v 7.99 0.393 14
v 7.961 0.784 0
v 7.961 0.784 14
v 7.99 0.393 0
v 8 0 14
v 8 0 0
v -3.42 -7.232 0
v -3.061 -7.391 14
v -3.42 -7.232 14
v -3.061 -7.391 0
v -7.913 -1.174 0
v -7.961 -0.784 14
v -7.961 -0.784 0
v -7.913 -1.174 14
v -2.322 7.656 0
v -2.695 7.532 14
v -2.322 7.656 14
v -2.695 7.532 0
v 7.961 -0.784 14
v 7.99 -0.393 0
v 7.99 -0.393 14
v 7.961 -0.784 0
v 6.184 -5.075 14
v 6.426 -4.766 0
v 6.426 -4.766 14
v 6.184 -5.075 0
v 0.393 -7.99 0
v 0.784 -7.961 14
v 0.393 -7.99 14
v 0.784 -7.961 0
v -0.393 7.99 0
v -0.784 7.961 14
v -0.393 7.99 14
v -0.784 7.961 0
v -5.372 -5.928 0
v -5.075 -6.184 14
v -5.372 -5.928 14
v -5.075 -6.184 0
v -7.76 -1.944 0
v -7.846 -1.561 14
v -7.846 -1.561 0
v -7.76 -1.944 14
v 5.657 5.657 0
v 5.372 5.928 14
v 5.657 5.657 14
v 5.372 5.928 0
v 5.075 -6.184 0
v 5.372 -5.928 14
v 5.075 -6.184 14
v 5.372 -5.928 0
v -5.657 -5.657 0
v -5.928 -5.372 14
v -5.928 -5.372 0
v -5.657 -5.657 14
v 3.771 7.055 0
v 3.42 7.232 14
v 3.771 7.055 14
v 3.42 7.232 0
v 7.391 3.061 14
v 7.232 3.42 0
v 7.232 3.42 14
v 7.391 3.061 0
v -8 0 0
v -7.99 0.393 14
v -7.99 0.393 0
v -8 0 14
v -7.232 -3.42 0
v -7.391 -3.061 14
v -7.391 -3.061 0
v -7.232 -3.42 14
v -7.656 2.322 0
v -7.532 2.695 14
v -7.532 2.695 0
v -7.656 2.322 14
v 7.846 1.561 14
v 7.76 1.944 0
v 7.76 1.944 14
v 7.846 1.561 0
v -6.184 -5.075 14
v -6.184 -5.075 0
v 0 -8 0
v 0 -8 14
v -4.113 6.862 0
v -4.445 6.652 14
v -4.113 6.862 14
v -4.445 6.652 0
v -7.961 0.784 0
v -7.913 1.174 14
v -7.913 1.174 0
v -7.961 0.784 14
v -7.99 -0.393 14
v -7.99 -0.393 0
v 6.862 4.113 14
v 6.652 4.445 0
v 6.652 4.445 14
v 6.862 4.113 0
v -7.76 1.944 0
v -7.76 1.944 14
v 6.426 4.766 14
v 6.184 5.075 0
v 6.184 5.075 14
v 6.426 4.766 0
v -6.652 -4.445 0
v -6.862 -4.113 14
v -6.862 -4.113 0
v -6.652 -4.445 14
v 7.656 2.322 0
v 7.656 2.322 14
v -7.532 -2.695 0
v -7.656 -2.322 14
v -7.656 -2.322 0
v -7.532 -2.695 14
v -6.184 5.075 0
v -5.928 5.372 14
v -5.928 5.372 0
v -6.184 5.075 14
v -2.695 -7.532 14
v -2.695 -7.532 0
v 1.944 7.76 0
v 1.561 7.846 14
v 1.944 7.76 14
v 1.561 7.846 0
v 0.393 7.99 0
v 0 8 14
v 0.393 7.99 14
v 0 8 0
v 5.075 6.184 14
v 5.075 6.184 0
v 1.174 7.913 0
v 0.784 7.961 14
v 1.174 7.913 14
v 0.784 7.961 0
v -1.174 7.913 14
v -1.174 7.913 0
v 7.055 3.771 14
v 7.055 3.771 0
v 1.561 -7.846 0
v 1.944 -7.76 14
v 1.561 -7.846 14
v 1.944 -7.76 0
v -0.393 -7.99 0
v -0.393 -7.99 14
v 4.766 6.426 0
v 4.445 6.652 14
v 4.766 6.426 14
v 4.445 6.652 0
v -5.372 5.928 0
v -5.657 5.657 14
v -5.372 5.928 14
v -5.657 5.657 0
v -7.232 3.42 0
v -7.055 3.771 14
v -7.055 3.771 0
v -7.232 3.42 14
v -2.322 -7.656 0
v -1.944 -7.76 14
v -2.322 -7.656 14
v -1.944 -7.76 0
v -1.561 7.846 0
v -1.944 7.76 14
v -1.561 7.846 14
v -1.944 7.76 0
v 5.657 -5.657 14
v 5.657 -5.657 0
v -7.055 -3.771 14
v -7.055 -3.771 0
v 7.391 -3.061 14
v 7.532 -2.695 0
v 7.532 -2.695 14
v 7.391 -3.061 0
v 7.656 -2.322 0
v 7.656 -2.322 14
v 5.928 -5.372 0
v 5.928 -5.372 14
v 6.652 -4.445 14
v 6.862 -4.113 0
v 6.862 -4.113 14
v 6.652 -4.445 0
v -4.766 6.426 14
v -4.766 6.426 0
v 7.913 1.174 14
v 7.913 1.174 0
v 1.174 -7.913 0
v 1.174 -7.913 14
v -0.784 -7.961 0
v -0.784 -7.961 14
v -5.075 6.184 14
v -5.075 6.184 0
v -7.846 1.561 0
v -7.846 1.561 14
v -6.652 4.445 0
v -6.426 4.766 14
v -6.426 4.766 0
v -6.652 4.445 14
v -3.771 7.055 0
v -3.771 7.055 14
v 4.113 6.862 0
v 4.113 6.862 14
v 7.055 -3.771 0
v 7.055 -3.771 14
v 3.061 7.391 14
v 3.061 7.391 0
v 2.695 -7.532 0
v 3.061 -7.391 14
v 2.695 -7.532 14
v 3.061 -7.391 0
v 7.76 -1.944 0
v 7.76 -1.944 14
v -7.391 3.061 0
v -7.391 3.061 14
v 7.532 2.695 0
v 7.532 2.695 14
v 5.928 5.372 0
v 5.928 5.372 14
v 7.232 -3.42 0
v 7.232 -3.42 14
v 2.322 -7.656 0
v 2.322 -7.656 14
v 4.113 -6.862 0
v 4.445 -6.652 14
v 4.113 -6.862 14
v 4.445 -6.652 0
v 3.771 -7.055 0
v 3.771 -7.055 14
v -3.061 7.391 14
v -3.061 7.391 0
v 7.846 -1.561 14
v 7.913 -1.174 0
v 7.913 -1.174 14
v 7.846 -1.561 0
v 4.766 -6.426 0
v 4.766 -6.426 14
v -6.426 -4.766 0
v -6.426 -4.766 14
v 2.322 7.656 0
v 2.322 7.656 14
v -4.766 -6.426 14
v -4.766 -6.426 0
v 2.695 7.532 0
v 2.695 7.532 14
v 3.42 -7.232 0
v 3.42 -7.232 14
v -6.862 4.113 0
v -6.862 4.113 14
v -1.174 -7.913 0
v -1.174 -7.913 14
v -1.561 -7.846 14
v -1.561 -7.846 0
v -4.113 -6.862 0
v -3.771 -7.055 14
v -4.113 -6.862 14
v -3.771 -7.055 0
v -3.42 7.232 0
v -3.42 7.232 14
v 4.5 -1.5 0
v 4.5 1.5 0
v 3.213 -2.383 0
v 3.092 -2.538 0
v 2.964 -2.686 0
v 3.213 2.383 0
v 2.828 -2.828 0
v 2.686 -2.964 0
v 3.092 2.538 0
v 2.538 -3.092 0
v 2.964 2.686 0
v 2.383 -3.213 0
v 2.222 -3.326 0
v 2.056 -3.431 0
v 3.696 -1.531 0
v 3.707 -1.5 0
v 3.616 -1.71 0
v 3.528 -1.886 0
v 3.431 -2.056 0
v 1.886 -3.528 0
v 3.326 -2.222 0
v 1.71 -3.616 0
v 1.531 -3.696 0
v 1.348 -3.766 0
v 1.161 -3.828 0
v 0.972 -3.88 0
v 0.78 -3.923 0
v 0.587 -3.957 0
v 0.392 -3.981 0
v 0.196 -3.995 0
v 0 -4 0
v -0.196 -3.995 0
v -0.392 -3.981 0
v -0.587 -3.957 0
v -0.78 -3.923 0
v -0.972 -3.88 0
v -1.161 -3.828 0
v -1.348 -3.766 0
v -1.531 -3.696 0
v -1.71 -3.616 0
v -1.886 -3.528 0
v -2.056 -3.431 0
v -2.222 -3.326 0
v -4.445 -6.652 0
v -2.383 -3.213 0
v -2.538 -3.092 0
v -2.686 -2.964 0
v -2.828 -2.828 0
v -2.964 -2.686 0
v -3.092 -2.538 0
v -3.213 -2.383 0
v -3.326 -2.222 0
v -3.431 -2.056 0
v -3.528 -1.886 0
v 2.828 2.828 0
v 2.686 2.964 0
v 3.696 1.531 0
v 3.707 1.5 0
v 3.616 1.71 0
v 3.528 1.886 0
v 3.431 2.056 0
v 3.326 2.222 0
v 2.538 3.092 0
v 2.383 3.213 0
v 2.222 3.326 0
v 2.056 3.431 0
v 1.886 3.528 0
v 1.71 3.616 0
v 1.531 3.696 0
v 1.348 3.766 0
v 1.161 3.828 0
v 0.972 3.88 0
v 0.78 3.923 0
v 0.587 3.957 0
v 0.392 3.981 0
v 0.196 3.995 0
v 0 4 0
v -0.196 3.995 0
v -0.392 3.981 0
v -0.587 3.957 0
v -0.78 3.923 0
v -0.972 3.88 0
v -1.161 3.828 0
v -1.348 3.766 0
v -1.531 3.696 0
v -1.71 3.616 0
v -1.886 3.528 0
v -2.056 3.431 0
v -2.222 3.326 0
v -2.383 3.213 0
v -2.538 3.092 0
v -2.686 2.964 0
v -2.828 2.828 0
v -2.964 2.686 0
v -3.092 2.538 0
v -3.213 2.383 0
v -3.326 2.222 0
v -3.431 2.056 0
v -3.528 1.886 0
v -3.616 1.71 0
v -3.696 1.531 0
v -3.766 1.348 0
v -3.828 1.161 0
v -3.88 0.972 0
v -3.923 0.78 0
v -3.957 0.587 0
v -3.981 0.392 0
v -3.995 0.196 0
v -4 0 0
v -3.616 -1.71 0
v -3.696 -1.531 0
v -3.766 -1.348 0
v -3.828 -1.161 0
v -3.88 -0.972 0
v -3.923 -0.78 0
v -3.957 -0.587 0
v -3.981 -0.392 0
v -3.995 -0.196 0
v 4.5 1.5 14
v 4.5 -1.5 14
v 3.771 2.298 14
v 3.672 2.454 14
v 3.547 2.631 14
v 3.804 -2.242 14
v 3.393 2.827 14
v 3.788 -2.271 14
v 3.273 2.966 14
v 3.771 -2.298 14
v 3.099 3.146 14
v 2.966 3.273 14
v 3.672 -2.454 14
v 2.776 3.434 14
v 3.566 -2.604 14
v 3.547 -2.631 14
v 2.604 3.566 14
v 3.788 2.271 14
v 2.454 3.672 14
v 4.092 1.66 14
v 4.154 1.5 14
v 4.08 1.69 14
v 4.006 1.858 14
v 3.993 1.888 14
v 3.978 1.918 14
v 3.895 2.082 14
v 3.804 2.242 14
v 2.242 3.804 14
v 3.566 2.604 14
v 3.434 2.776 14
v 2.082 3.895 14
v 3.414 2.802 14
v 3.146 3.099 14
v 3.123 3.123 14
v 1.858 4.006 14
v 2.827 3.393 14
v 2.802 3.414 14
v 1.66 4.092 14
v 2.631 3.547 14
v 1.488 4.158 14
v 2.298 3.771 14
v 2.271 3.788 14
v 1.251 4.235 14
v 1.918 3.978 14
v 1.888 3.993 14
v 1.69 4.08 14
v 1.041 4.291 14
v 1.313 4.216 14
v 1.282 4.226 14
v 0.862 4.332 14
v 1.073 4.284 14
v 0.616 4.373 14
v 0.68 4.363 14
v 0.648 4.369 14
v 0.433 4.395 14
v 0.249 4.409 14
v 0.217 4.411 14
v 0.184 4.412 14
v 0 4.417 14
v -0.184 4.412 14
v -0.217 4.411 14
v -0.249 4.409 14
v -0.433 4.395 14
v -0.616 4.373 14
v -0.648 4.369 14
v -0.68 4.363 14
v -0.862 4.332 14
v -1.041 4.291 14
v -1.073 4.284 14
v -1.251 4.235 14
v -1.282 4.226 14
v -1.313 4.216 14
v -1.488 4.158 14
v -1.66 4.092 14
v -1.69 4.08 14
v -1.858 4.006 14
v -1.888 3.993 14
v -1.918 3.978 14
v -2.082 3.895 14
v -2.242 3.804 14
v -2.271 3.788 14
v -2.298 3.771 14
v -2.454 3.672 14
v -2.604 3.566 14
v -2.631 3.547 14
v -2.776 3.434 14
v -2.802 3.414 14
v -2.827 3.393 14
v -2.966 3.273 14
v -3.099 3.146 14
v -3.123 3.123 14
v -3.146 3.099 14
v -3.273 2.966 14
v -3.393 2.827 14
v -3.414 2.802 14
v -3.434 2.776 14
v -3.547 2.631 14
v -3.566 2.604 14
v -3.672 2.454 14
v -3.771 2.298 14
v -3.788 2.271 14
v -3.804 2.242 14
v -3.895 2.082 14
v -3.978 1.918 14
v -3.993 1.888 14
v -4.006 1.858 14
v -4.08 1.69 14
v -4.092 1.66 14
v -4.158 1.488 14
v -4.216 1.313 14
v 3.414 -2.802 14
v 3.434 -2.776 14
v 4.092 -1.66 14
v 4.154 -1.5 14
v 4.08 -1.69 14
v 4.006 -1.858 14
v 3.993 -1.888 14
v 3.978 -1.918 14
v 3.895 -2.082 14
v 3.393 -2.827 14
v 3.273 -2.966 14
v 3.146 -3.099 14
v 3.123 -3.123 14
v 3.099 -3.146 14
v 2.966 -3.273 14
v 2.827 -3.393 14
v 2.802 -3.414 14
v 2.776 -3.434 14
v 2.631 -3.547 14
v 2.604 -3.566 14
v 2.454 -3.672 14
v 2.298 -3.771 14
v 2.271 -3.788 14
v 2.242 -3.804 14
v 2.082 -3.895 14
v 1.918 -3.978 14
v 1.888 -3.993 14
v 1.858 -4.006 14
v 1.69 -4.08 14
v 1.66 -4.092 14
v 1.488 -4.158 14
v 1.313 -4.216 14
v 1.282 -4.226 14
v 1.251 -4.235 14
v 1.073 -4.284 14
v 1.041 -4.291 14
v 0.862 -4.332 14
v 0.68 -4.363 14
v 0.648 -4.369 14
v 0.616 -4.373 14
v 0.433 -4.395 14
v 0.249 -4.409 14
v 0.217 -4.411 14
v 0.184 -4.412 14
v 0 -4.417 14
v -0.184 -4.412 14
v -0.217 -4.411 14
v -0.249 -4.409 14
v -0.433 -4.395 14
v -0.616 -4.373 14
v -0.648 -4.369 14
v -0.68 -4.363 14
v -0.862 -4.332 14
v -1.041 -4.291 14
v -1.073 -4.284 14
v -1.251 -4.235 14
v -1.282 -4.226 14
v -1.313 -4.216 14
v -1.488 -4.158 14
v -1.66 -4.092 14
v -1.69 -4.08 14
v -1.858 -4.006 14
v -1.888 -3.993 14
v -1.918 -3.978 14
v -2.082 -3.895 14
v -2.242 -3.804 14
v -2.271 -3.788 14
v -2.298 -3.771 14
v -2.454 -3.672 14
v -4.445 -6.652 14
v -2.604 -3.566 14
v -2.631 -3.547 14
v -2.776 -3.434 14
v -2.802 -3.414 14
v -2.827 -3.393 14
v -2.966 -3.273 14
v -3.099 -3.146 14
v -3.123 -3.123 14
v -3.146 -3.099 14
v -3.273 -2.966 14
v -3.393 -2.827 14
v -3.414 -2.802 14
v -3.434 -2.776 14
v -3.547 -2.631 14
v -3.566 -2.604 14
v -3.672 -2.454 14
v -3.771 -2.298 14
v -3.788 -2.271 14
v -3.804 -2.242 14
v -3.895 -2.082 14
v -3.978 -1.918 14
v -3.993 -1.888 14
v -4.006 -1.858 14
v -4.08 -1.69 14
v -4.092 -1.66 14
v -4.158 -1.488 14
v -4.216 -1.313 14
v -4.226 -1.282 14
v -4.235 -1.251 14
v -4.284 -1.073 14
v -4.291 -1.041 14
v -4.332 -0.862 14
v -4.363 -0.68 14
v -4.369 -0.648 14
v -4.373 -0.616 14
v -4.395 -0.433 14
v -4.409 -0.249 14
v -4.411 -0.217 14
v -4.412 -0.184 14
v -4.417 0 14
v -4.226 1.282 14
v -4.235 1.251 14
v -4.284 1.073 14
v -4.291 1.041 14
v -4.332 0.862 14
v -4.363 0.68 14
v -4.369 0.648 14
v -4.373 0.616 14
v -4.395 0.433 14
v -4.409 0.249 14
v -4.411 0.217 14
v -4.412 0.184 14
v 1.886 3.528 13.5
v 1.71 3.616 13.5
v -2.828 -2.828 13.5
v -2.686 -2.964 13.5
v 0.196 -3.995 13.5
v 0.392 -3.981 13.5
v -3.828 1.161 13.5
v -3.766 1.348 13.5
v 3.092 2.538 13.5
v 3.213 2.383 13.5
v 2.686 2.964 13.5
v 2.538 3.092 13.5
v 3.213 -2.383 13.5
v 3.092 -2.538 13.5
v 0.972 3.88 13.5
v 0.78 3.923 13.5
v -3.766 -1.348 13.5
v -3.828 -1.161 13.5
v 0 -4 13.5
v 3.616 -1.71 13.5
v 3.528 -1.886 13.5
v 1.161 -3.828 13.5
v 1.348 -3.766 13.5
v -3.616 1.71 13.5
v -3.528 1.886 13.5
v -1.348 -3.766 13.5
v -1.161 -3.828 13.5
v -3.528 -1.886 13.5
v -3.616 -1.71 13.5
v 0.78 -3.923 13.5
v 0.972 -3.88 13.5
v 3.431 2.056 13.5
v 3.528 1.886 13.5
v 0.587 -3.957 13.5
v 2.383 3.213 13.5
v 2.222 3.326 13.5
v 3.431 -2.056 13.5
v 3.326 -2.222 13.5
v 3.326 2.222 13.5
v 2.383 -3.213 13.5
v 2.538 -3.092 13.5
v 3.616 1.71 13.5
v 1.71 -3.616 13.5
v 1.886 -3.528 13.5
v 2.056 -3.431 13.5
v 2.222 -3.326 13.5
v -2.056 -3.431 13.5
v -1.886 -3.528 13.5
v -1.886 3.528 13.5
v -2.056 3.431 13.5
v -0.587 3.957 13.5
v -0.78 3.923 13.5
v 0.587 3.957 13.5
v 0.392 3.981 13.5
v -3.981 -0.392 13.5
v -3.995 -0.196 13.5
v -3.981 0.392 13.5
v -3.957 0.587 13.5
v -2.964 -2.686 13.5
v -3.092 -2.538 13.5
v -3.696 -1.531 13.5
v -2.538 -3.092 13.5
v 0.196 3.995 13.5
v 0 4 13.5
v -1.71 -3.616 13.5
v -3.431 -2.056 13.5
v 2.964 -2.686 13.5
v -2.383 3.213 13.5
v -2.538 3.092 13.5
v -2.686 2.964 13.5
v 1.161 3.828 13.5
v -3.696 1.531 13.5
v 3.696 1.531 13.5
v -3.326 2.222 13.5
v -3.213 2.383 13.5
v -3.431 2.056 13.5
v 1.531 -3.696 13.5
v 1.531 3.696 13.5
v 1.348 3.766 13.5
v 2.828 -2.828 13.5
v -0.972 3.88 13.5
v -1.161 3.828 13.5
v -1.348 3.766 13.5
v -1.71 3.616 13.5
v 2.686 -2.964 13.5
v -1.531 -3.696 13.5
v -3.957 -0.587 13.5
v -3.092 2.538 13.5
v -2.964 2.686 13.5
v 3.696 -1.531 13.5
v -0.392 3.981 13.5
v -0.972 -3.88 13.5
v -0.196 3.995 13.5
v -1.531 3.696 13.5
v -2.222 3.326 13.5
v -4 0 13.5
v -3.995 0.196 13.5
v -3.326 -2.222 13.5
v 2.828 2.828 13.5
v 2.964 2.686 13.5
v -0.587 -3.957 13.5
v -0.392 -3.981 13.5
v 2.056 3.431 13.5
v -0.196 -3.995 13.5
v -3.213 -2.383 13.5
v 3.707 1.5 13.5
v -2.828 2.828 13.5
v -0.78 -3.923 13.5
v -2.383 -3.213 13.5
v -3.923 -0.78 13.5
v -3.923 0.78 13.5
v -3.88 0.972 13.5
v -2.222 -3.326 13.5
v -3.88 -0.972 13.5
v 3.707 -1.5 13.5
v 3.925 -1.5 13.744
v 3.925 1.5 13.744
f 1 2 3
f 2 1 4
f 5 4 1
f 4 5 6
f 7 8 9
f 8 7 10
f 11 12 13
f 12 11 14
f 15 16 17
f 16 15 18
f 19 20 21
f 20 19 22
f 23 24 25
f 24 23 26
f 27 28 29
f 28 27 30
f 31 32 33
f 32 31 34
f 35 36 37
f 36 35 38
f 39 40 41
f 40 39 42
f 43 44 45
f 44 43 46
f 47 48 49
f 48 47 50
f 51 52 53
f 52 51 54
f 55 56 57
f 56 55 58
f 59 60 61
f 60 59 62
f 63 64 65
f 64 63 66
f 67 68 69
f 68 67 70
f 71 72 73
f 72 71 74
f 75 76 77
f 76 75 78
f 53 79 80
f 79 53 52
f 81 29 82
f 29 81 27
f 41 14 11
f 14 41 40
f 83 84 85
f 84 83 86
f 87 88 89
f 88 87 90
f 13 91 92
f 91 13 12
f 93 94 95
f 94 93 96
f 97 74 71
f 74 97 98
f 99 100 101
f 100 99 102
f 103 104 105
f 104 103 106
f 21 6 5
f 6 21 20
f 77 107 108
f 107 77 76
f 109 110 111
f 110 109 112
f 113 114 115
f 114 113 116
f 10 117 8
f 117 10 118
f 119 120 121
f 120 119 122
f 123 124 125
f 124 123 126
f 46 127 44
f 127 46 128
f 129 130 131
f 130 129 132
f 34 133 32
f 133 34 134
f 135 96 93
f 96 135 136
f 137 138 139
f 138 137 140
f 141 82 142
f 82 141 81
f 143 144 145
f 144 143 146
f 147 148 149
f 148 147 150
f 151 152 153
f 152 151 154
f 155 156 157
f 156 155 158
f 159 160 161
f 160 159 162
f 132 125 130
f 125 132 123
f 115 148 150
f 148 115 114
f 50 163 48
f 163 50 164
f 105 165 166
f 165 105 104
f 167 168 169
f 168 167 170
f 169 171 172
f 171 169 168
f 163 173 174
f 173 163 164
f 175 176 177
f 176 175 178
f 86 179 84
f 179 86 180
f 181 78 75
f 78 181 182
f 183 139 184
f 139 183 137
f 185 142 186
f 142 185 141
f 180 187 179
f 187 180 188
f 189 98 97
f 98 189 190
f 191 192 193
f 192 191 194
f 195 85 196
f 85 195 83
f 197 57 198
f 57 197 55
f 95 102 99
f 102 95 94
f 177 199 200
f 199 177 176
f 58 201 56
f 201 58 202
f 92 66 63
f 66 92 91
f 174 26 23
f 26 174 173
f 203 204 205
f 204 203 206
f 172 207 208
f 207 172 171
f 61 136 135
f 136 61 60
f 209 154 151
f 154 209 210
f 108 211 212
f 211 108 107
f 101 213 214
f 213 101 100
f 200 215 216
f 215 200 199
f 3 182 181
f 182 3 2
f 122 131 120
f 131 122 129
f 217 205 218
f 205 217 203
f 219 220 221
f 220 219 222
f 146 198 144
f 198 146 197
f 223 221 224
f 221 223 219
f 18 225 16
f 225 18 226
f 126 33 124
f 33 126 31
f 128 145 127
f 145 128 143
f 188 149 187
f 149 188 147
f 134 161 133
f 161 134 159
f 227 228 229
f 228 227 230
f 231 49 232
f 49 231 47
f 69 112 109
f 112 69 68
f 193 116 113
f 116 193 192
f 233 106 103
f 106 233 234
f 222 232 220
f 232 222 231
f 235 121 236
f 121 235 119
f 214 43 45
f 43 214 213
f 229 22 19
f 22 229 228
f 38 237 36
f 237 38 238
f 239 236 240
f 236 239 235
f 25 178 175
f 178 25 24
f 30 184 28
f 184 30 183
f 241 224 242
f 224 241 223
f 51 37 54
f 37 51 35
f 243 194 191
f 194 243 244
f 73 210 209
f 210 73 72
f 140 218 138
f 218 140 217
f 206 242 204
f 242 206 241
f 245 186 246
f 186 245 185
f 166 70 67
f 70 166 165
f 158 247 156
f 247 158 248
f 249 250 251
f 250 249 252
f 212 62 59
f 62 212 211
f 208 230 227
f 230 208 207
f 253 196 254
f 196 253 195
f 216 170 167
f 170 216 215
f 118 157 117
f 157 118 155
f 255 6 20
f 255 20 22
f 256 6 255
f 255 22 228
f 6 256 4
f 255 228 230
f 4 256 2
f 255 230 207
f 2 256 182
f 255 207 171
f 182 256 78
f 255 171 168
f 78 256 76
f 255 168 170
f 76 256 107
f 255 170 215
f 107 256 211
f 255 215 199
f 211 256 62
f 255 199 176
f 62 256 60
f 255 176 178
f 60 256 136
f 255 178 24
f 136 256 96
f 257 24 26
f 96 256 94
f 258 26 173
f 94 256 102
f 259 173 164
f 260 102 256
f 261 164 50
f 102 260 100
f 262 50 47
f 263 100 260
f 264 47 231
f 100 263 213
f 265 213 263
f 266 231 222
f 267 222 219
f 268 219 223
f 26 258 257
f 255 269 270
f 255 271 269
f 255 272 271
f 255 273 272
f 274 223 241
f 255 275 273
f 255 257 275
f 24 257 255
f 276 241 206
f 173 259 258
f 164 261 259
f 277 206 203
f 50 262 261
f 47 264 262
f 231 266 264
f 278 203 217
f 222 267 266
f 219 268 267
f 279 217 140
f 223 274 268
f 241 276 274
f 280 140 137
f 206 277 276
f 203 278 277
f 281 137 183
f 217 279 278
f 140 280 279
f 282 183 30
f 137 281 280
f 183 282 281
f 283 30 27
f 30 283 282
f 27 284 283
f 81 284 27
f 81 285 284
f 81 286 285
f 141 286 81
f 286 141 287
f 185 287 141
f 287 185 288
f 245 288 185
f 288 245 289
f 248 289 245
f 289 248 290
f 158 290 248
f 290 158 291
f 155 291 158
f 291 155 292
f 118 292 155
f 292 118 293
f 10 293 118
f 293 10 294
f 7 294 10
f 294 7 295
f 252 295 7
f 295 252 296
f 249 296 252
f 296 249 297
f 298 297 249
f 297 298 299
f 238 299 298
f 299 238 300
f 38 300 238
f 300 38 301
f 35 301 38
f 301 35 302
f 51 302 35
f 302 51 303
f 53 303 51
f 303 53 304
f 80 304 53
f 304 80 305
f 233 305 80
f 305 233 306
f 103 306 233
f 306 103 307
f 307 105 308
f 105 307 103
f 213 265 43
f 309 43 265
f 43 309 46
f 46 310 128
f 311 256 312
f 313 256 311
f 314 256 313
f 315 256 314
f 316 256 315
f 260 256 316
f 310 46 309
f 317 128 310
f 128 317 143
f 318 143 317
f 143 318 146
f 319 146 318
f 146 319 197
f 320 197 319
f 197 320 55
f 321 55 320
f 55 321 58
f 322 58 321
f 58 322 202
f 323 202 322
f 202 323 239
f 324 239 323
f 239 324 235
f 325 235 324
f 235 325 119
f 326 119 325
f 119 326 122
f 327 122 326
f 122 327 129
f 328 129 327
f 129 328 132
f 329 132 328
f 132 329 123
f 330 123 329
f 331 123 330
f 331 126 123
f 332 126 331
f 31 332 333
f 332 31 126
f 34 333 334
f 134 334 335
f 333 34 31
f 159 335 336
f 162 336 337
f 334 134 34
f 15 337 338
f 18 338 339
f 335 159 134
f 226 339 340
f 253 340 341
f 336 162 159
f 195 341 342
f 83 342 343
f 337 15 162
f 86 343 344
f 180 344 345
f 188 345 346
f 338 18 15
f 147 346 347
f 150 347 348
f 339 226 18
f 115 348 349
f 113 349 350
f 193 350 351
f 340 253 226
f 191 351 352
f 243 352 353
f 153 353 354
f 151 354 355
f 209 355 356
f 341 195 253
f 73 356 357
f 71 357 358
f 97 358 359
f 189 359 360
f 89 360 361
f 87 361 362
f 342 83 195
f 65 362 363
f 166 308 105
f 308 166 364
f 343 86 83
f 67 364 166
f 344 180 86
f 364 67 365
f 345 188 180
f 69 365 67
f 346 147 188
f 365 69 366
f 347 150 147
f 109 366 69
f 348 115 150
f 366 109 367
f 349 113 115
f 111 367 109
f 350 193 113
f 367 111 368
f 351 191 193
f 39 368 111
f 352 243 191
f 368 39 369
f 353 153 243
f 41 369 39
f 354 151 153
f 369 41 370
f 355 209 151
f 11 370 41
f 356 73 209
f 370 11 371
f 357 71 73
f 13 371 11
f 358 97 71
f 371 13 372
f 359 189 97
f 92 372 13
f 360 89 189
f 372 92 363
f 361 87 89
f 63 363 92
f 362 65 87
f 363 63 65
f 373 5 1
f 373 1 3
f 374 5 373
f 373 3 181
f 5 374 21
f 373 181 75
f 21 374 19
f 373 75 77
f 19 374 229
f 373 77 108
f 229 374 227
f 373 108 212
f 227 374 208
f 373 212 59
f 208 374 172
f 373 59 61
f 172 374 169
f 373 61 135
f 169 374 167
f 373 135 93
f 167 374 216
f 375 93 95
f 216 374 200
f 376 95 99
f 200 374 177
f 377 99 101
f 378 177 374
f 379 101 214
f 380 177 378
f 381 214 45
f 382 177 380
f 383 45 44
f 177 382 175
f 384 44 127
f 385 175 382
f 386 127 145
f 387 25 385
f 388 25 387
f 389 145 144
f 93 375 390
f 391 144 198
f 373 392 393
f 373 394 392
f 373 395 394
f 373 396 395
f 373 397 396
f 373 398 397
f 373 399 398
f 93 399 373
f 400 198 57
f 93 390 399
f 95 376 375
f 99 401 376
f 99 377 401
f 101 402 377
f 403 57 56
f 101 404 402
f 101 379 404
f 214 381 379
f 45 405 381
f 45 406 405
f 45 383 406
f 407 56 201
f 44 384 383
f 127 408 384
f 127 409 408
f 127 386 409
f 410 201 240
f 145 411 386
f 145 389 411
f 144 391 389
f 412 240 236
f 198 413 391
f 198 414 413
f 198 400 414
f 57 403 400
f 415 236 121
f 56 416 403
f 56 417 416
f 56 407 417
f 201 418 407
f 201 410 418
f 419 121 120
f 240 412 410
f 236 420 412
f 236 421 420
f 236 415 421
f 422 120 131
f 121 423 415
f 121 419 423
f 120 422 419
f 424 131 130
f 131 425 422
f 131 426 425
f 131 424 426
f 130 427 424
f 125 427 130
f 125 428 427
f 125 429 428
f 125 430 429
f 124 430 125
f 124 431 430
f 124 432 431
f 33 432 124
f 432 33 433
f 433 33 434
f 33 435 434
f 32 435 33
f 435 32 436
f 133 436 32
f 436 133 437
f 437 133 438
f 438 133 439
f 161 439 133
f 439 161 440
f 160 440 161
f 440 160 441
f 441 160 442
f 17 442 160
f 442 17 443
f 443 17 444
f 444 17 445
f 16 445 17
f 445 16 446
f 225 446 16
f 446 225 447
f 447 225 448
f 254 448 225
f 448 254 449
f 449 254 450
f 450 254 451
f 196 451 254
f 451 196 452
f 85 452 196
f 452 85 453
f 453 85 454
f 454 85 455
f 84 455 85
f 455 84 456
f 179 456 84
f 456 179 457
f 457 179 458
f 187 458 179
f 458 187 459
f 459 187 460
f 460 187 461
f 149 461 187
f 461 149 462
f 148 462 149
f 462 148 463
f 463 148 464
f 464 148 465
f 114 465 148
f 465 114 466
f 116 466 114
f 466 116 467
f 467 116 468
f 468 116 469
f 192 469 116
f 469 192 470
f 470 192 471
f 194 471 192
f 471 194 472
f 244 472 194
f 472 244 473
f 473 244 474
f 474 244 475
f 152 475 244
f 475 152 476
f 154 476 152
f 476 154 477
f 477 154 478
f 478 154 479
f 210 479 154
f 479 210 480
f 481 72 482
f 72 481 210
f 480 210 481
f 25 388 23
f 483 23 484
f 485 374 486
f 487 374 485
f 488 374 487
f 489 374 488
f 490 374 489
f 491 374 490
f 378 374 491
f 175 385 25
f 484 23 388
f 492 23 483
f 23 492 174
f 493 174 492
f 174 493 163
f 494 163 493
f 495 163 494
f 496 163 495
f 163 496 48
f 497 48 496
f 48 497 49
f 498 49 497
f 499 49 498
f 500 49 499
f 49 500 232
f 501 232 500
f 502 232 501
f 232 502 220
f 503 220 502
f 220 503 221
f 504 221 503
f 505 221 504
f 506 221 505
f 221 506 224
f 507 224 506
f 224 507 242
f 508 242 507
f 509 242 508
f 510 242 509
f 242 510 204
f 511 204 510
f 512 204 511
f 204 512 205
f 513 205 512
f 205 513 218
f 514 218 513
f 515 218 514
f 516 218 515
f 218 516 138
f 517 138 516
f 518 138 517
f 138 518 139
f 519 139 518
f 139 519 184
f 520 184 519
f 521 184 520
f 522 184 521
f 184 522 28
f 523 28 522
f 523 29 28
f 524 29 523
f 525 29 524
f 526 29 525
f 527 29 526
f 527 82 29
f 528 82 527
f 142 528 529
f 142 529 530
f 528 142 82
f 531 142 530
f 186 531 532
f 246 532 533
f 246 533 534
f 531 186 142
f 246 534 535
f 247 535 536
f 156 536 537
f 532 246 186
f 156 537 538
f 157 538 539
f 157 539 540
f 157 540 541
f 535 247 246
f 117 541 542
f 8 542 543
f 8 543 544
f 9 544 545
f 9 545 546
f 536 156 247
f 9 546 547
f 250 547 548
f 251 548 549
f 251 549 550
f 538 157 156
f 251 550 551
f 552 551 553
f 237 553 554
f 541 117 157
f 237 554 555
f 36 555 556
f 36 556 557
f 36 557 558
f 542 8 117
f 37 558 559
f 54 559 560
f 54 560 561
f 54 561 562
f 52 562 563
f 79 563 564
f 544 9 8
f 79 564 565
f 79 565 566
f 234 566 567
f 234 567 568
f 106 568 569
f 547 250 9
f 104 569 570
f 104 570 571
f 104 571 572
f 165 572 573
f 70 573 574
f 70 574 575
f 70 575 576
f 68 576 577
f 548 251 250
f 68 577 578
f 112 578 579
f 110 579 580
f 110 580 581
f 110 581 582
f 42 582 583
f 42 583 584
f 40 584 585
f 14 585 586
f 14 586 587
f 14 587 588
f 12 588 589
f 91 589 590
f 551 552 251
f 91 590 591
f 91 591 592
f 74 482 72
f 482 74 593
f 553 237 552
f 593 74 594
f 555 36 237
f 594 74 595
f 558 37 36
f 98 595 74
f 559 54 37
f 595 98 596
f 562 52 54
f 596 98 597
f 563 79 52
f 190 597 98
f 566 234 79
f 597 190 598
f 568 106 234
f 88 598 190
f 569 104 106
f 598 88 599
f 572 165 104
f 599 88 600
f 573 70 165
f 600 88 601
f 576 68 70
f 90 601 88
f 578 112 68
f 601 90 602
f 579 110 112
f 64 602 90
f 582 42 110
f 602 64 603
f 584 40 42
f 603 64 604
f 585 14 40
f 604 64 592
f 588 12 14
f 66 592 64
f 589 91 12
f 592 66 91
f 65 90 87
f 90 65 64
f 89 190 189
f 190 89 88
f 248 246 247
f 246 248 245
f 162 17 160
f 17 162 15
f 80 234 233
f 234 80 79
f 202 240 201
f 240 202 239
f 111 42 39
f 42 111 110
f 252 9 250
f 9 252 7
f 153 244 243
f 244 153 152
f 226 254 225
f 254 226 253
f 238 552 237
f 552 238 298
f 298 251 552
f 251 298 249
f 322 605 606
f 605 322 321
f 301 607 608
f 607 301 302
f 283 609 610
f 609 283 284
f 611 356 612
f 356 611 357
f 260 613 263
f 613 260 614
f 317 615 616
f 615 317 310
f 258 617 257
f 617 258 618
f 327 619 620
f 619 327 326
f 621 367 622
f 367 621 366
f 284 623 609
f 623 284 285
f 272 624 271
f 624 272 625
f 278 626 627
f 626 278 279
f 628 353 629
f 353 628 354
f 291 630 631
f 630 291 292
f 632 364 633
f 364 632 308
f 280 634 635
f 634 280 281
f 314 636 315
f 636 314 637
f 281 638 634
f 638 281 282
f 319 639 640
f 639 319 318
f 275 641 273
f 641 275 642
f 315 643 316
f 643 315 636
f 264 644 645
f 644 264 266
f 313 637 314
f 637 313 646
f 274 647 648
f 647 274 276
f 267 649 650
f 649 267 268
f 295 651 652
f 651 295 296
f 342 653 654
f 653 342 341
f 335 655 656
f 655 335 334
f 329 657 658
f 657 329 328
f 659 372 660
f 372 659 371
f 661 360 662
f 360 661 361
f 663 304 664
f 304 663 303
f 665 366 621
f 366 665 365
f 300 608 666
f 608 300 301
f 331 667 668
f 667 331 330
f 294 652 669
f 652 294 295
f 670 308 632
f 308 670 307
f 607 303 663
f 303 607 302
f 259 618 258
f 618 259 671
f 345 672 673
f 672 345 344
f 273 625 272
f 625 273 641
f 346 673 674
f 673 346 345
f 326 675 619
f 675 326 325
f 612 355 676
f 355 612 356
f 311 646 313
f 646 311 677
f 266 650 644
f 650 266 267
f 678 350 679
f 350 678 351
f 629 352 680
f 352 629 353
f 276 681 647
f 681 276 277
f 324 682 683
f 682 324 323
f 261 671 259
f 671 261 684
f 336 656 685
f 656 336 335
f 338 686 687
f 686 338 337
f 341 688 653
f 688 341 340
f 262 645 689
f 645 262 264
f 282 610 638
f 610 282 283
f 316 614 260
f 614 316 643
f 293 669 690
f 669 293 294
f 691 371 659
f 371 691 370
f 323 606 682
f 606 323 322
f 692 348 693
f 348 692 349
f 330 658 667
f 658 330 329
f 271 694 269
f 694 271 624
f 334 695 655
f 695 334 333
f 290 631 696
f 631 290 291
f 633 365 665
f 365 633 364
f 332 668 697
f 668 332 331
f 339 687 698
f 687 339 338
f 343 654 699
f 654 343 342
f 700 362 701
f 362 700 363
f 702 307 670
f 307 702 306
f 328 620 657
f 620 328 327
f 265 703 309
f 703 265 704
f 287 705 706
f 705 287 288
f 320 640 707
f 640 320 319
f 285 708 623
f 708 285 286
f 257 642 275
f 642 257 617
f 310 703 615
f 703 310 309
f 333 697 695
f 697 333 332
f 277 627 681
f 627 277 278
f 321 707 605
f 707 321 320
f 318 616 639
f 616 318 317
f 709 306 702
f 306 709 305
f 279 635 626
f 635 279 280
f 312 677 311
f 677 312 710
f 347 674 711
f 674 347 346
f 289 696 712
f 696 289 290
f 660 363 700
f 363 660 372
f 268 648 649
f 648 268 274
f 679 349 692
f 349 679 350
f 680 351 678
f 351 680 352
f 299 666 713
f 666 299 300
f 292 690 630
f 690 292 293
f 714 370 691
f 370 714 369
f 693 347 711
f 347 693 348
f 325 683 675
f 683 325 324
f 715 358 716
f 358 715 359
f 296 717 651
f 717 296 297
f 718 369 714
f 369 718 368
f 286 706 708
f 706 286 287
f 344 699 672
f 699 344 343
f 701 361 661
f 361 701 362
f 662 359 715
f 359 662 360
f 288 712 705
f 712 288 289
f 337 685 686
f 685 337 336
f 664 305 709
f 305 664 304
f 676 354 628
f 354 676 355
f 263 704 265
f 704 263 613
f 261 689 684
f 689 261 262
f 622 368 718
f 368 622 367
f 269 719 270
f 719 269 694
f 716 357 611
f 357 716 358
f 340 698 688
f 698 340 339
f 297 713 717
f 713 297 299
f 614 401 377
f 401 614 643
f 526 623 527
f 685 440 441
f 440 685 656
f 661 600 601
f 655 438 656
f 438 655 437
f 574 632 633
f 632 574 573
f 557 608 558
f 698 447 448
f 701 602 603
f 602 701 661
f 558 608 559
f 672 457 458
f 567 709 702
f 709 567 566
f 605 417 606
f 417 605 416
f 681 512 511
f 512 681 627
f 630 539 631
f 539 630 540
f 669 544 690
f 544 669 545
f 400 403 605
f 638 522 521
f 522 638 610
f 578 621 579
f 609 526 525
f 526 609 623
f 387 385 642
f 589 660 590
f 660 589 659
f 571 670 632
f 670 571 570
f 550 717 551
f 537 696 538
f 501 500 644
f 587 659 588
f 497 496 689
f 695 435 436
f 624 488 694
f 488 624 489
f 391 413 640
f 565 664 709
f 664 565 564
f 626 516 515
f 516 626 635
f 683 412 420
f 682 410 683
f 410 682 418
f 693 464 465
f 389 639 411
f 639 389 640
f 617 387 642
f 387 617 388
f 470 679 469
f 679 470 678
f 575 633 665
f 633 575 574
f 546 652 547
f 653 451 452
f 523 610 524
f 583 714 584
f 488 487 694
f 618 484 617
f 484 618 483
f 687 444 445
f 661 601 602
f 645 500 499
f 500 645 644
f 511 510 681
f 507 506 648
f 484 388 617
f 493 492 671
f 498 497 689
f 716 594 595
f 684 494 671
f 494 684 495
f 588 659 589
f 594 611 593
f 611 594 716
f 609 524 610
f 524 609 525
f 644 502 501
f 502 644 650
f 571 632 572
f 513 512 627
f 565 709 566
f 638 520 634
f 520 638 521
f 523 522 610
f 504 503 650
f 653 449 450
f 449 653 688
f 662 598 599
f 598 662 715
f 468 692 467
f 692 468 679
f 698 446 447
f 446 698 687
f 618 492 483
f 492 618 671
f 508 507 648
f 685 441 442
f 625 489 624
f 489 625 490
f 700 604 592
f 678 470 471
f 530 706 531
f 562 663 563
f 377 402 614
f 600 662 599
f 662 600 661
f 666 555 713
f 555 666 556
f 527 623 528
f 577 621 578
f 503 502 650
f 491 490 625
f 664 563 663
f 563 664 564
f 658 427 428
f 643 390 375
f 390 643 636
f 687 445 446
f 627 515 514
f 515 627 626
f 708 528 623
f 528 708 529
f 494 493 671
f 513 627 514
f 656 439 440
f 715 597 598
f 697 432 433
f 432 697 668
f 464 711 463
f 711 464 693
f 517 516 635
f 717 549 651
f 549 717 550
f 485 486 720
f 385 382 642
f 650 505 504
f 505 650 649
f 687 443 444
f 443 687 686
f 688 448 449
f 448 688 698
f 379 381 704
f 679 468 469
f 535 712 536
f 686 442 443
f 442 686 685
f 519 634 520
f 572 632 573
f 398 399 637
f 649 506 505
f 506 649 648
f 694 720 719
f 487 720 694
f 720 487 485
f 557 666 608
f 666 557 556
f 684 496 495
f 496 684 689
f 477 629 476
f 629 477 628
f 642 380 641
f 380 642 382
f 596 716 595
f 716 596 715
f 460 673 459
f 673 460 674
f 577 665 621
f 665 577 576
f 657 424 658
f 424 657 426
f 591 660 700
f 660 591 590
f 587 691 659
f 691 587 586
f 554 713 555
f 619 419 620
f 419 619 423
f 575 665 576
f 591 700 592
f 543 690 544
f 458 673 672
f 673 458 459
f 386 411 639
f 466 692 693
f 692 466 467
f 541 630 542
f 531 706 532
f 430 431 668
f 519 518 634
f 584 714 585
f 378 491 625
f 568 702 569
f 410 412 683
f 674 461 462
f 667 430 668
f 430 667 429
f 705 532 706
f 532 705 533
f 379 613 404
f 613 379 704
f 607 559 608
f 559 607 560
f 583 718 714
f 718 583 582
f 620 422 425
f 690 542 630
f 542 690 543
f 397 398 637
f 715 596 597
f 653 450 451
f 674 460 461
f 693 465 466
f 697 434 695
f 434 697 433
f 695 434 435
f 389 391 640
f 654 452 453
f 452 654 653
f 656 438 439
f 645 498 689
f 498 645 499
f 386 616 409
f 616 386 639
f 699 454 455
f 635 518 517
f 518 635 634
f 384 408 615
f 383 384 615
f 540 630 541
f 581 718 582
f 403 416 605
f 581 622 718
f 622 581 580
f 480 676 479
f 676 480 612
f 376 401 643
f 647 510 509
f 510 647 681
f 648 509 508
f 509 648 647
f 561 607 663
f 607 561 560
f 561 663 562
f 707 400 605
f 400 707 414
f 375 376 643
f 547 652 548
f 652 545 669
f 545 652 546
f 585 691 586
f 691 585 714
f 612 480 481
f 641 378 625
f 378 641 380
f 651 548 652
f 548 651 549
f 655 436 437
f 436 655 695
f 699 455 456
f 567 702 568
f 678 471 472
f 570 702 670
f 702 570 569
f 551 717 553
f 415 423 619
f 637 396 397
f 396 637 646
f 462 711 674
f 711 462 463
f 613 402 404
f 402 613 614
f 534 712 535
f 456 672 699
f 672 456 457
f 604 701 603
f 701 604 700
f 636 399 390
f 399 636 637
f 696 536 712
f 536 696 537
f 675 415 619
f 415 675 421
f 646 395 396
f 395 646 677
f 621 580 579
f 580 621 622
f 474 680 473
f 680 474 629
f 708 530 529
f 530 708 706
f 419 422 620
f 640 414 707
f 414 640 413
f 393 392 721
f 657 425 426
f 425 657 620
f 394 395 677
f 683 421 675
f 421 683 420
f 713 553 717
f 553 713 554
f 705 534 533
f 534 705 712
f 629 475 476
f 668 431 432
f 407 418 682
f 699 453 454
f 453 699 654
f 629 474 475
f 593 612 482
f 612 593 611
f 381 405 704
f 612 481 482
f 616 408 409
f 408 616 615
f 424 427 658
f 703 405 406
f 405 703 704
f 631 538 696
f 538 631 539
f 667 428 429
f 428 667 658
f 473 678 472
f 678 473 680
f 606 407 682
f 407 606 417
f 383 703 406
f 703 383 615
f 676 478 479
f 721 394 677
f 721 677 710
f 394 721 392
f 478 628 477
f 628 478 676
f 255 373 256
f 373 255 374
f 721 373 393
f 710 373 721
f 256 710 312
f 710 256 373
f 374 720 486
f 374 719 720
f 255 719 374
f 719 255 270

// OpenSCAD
// ============================================================
//  Parametric Transmission Generator — OpenSCAD
//  Author:  olesiapal
//  Version: 3.0
//  License: MIT
//
//  Modes:
//    • single       — one configurable spur or herringbone gear
//    • pair         — matched gear pair with auto centre distance
//    • mesh_preview — pair with visual debugging colours
//
//  The public interface is built around:
//    • gear(...)
//    • gear_pair(...)
//
//  Geometry is parameter-driven per gear, so the mate no longer
//  depends on the primary gear's global tooth definition.
// ============================================================

/* [Render Mode] */
render_mode    = "single"; // single / pair / mesh_preview
show_mate      = false;    // Legacy flag: true -> pair mode
$fn            = 128;

/* [Primary Gear] */
module_size    = 2;        // Metric module [mm]
num_teeth      = 24;       // Primary tooth count
pressure_angle = 20;       // Pressure angle [deg]
gear_height    = 10;       // Face width [mm]
backlash       = 0.10;     // Backlash per flank [mm]

hub_diameter   = 16;       // Hub OD [mm]
hub_height     = 14;       // Hub height [mm]
bore_diameter  = 8;        // Bore diameter [mm]
keyway_width   = 3;        // Keyway width [mm]
keyway_depth   = 1.8;      // Keyway radial depth [mm]

enable_spokes  = true;     // Weight-reduction pockets
spoke_count    = 5;        // Number of spokes
spoke_width    = 5;        // Spoke width [mm]
pocket_floor   = 1.5;      // Pocket floor [mm]

tip_chamfer    = 0.3;      // Tooth tip break edge [mm]
bore_chamfer   = 0.5;      // Bore chamfer [mm]

herringbone    = false;    // Enable double-helical geometry
helix_angle    = 25;       // Helix angle [deg]

/* [Mate Gear] */
mate_module_size    = 2;      // Mate module [mm]
mate_teeth          = 16;     // Mate tooth count
mate_pressure_angle = 20;     // Mate pressure angle [deg]
mate_gear_height    = 10;     // Mate face width [mm]
mate_backlash       = 0.10;   // Mate backlash [mm]

mate_hub_diameter   = 14;     // Mate hub OD [mm]
mate_hub_height     = 12;     // Mate hub height [mm]
mate_bore_diameter  = 6;      // Mate bore [mm]
mate_keyway_width   = 0;      // Mate keyway width [mm]
mate_keyway_depth   = 1.8;    // Mate keyway radial depth [mm]

mate_enable_spokes  = true;   // Mate spoke pockets
mate_spoke_count    = 4;      // Mate spoke count
mate_spoke_width    = 4;      // Mate spoke width [mm]
mate_pocket_floor   = 1.5;    // Mate pocket floor [mm]

mate_tip_chamfer    = 0.2;    // Mate tooth tip break edge [mm]
mate_bore_chamfer   = 0.4;    // Mate bore chamfer [mm]

mate_herringbone    = false;  // Mate herringbone mode
mate_helix_angle    = 25;     // Mate helix angle [deg]

/* [Preview] */
mesh_rotation_deg   = 10;     // Relative rotation for preview mode
show_centerline     = true;   // Show centre distance helper in pair modes

// ── Generic helpers ─────────────────────────────────────────
function resolved_mode() = show_mate ? "pair" : render_mode;
function pitch_radius(mod, teeth) = mod * teeth / 2;
function pitch_diameter(mod, teeth) = mod * teeth;
function base_radius(mod, teeth, pa) = pitch_radius(mod, teeth) * cos(pa);
function base_diameter(mod, teeth, pa) = pitch_diameter(mod, teeth) * cos(pa);
function addendum(mod) = mod;
function dedendum(mod) = 1.25 * mod;
function outside_radius(mod, teeth) = pitch_radius(mod, teeth) + addendum(mod);
function outside_diameter(mod, teeth) = 2 * outside_radius(mod, teeth);
function root_radius(mod, teeth) = pitch_radius(mod, teeth) - dedendum(mod);
function root_diameter(mod, teeth) = 2 * root_radius(mod, teeth);
function circular_pitch(mod) = mod * PI;
function base_pitch(mod, pa) = circular_pitch(mod) * cos(pa);
function recommended_min_teeth(pa) = ceil(2 / pow(sin(pa), 2));
function centre_distance(mod_a, teeth_a, mod_b, teeth_b) =
    pitch_radius(mod_a, teeth_a) + pitch_radius(mod_b, teeth_b);

function involute_intersect_angle(r, base_r) =
    r <= base_r ? 0 : sqrt(pow(r / base_r, 2) - 1) * 180 / PI;

function involute_point(base_r, t) =
    [base_r * (cos(t) + t * PI / 180 * sin(t)),
     base_r * (sin(t) - t * PI / 180 * cos(t))];

function tooth_flank_points(base_r, outer_r, steps = 24) = [
    for (i = [0 : steps])
        let(t_max = involute_intersect_angle(outer_r, base_r),
            t = i * t_max / steps)
        involute_point(base_r, t)
];

// ── 2D profiles ─────────────────────────────────────────────
module tooth_2d(mod, teeth, pa, backlash_mm, steps = 24) {
    pr = pitch_radius(mod, teeth);
    br = base_radius(mod, teeth, pa);
    rr = root_radius(mod, teeth);
    or_ = outside_radius(mod, teeth);
    half_thick_angle = 90 / teeth + involute_intersect_angle(pr, br);
    backlash_angle = backlash_mm / max(pr, 0.01) * 180 / PI;

    pts_r = tooth_flank_points(br, or_, steps);
    pts_l = [for (p = pts_r) [p[0], -p[1]]];

    rotate([0, 0, half_thick_angle - backlash_angle])
        polygon(concat(
            [[rr * cos(-1), rr * sin(-1)]],
            pts_r,
            [[or_ * cos(involute_intersect_angle(or_, br)),
              -or_ * sin(involute_intersect_angle(or_, br))]],
            [for (i = [len(pts_l) - 1 : -1 : 0]) pts_l[i]],
            [[rr * cos(1), -rr * sin(1)]]
        ));
}

module gear_2d(mod, teeth, pa, backlash_mm, bore_d) {
    difference() {
        union() {
            circle(r = root_radius(mod, teeth));
            for (i = [0 : teeth - 1])
                rotate([0, 0, i * 360 / teeth])
                    tooth_2d(mod, teeth, pa, backlash_mm);
        }
        circle(r = bore_d / 2);
    }
}

// ── Mechanical features ─────────────────────────────────────
module keyway_cut(bore_d, keyway_w, keyway_d, h) {
    if (keyway_w > 0)
        translate([bore_d / 2 - keyway_d, -keyway_w / 2, -1])
            cube([keyway_d + 0.5, keyway_w, h + 2]);
}

module spoke_pockets(mod, teeth, hub_d, spoke_n, spoke_w, pocket_floor_mm, h, enabled = true) {
    rr = root_radius(mod, teeth);

    if (enabled && spoke_n >= 3 && rr - hub_d / 2 > spoke_w * 2) {
        pocket_inner = hub_d / 2 + 2;
        pocket_outer = rr - mod * 2;
        pocket_angle = 360 / spoke_n;

        if (pocket_outer > pocket_inner + 4)
            translate([0, 0, pocket_floor_mm])
                difference() {
                    cylinder(h = h - pocket_floor_mm + 0.2, r = pocket_outer);
                    translate([0, 0, -0.5])
                        cylinder(h = h - pocket_floor_mm + 1.2, r = pocket_inner);

                    for (i = [0 : spoke_n - 1])
                        rotate([0, 0, i * pocket_angle])
                            translate([-spoke_w / 2, 0, -0.5])
                                cube([spoke_w, pocket_outer + 1, h - pocket_floor_mm + 1.2]);
                }
    }
}

module tip_chamfer_cut(outer_r, face_w, chamfer_mm) {
    if (chamfer_mm > 0)
        difference() {
            cylinder(r = outer_r + 1, h = face_w + 2);
            cylinder(r = outer_r, h = face_w + 2);
            cylinder(r1 = outer_r - chamfer_mm, r2 = outer_r, h = chamfer_mm);
            translate([0, 0, face_w - chamfer_mm])
                cylinder(r1 = outer_r, r2 = outer_r - chamfer_mm, h = chamfer_mm + 0.05);
        }
}

module hub_solid(hub_d, hub_h, bore_d, bore_chamfer_mm, keyway_w, keyway_d) {
    difference() {
        cylinder(h = hub_h, d = hub_d);
        cylinder(h = hub_h + 0.5, d = bore_d);

        if (bore_chamfer_mm > 0)
            translate([0, 0, hub_h - bore_chamfer_mm])
                cylinder(
                    h = bore_chamfer_mm + 0.1,
                    d1 = bore_d,
                    d2 = bore_d + bore_chamfer_mm * 2
                );

        keyway_cut(bore_d, keyway_w, keyway_d, hub_h);
    }
}

module gear_half(
    mod,
    teeth,
    pa,
    backlash_mm,
    face_w,
    bore_d,
    hub_d,
    hub_h,
    keyway_w,
    keyway_d,
    enable_spokes_flag,
    spoke_n,
    spoke_w,
    pocket_floor_mm,
    tip_chamfer_mm,
    bore_chamfer_mm,
    use_herringbone,
    helix_deg,
    twist_dir = 1
) {
    pr = pitch_radius(mod, teeth);
    or_ = outside_radius(mod, teeth);
    twist = use_herringbone ? twist_dir * tan(helix_deg) * face_w / max(pr, 0.01) * 180 / PI : 0;

    difference() {
        linear_extrude(height = face_w, twist = twist, convexity = 10)
            gear_2d(mod, teeth, pa, backlash_mm, bore_d);

        spoke_pockets(mod, teeth, hub_d, spoke_n, spoke_w, pocket_floor_mm, face_w, enable_spokes_flag);
        keyway_cut(bore_d, keyway_w, keyway_d, face_w);
        tip_chamfer_cut(or_, face_w, tip_chamfer_mm);
    }
}

module gear(
    mod,
    teeth,
    pa,
    backlash_mm,
    face_w,
    hub_d,
    hub_h,
    bore_d,
    keyway_w,
    keyway_d,
    enable_spokes_flag,
    spoke_n,
    spoke_w,
    pocket_floor_mm,
    tip_chamfer_mm,
    bore_chamfer_mm,
    use_herringbone,
    helix_deg
) {
    assert(mod > 0, "Module must be positive");
    assert(teeth >= 8, "Minimum 8 teeth for valid involute geometry");
    assert(face_w > 0, "Face width must be positive");
    assert(bore_d > 0, "Bore diameter must be positive");
    assert(hub_d > bore_d, "Hub diameter must be larger than bore");
    assert(root_radius(mod, teeth) > hub_d / 2 + 1,
           "Hub too large for selected tooth count/module");

    if (use_herringbone) {
        gear_half(
            mod, teeth, pa, backlash_mm, face_w / 2, bore_d, hub_d, hub_h,
            keyway_w, keyway_d, enable_spokes_flag, spoke_n, spoke_w,
            pocket_floor_mm, tip_chamfer_mm, bore_chamfer_mm, true, helix_deg, 1
        );
        translate([0, 0, face_w / 2])
            gear_half(
                mod, teeth, pa, backlash_mm, face_w / 2, bore_d, hub_d, hub_h,
                keyway_w, keyway_d, enable_spokes_flag, spoke_n, spoke_w,
                pocket_floor_mm, tip_chamfer_mm, bore_chamfer_mm, true, helix_deg, -1
            );
    } else {
        gear_half(
            mod, teeth, pa, backlash_mm, face_w, bore_d, hub_d, hub_h,
            keyway_w, keyway_d, enable_spokes_flag, spoke_n, spoke_w,
            pocket_floor_mm, tip_chamfer_mm, bore_chamfer_mm, false, helix_deg, 1
        );
    }

    hub_solid(hub_d, hub_h, bore_d, bore_chamfer_mm, keyway_w, keyway_d);
}

module center_distance_line(cd, z = 0) {
    if (show_centerline)
        color("OrangeRed", 0.6)
            translate([cd / 2, 0, z + 0.2])
                cube([cd, 0.8, 0.8], center = true);
}

module gear_pair(
    primary_module = module_size,
    primary_teeth = num_teeth,
    primary_pressure_angle = pressure_angle,
    primary_backlash = backlash,
    primary_face_width = gear_height,
    primary_hub_diameter = hub_diameter,
    primary_hub_height = hub_height,
    primary_bore_diameter = bore_diameter,
    primary_keyway_width = keyway_width,
    primary_keyway_depth = keyway_depth,
    primary_enable_spokes = enable_spokes,
    primary_spoke_count = spoke_count,
    primary_spoke_width = spoke_width,
    primary_pocket_floor = pocket_floor,
    primary_tip_chamfer = tip_chamfer,
    primary_bore_chamfer = bore_chamfer,
    primary_herringbone = herringbone,
    primary_helix_angle = helix_angle,
    secondary_module = mate_module_size,
    secondary_teeth = mate_teeth,
    secondary_pressure_angle = mate_pressure_angle,
    secondary_backlash = mate_backlash,
    secondary_face_width = mate_gear_height,
    secondary_hub_diameter = mate_hub_diameter,
    secondary_hub_height = mate_hub_height,
    secondary_bore_diameter = mate_bore_diameter,
    secondary_keyway_width = mate_keyway_width,
    secondary_keyway_depth = mate_keyway_depth,
    secondary_enable_spokes = mate_enable_spokes,
    secondary_spoke_count = mate_spoke_count,
    secondary_spoke_width = mate_spoke_width,
    secondary_pocket_floor = mate_pocket_floor,
    secondary_tip_chamfer = mate_tip_chamfer,
    secondary_bore_chamfer = mate_bore_chamfer,
    secondary_herringbone = mate_herringbone,
    secondary_helix_angle = mate_helix_angle
) {
    cd = centre_distance(primary_module, primary_teeth, secondary_module, secondary_teeth);
    resolved = resolved_mode();

    color(resolved == "mesh_preview" ? "SteelBlue" : "SteelBlue", 1.0)
        gear(
            primary_module, primary_teeth, primary_pressure_angle, primary_backlash, primary_face_width,
            primary_hub_diameter, primary_hub_height, primary_bore_diameter, primary_keyway_width, primary_keyway_depth,
            primary_enable_spokes, primary_spoke_count, primary_spoke_width, primary_pocket_floor, primary_tip_chamfer,
            primary_bore_chamfer, primary_herringbone, primary_helix_angle
        );

    color(resolved == "mesh_preview" ? "Tomato" : "CadetBlue", resolved == "mesh_preview" ? 0.55 : 1.0)
        translate([cd, 0, 0])
            rotate([0, 0, 180 / secondary_teeth + mesh_rotation_deg])
                gear(
                    secondary_module, secondary_teeth, secondary_pressure_angle, secondary_backlash, secondary_face_width,
                    secondary_hub_diameter, secondary_hub_height, secondary_bore_diameter, secondary_keyway_width, secondary_keyway_depth,
                    secondary_enable_spokes, secondary_spoke_count, secondary_spoke_width, secondary_pocket_floor, secondary_tip_chamfer,
                    secondary_bore_chamfer, secondary_herringbone, secondary_helix_angle
                );

    center_distance_line(cd, max(primary_face_width, secondary_face_width) / 2);
}

// ── Reporting ───────────────────────────────────────────────
module report_gear(label, mod, teeth, pa, face_w, hub_d, bore_d) {
    min_teeth = recommended_min_teeth(pa);

    echo(str("── ", label, " ─────────────────────────────"));
    echo(str("  Teeth:              ", teeth));
    echo(str("  Module:             ", mod, " mm"));
    echo(str("  Pressure angle:     ", pa, " deg"));
    echo(str("  Pitch diameter:     ", pitch_diameter(mod, teeth), " mm"));
    echo(str("  Outside diameter:   ", outside_diameter(mod, teeth), " mm"));
    echo(str("  Root diameter:      ", root_diameter(mod, teeth), " mm"));
    echo(str("  Base circle:        ", base_diameter(mod, teeth, pa), " mm"));
    echo(str("  Circular pitch:     ", circular_pitch(mod), " mm"));
    echo(str("  Base pitch:         ", base_pitch(mod, pa), " mm"));
    echo(str("  Face width:         ", face_w, " mm"));
    echo(str("  Hub / bore:         ", hub_d, " / ", bore_d, " mm"));

    if (teeth < min_teeth)
        echo(str("  WARNING: Tooth count below ~", min_teeth,
                 " for ", pa, " deg; undercut risk is high."));

    if (root_radius(mod, teeth) <= hub_d / 2 + 1)
        echo("  WARNING: Hub diameter is crowding the tooth root.");
}

module report_pair() {
    ratio = mate_teeth / num_teeth;
    cd = centre_distance(module_size, num_teeth, mate_module_size, mate_teeth);

    echo("── Pair Metrics ─────────────────────────");
    echo(str("  Ratio (mate / primary): ", ratio));
    echo(str("  Centre distance:        ", cd, " mm"));
    echo(str("  Pitch diameters:        ",
             pitch_diameter(module_size, num_teeth), " / ",
             pitch_diameter(mate_module_size, mate_teeth), " mm"));

    if (module_size != mate_module_size)
        echo("  WARNING: Modules do not match; pair is not manufacturing-compatible.");

    if (pressure_angle != mate_pressure_angle)
        echo("  WARNING: Pressure angles do not match; tooth action is not compatible.");

    if (abs(backlash - mate_backlash) > 0.15)
        echo("  WARNING: Backlash settings differ materially between the pair.");

    if (herringbone != mate_herringbone)
        echo("  WARNING: One gear is herringbone and the other is not.");

    if (herringbone && mate_herringbone && helix_angle != mate_helix_angle)
        echo("  WARNING: Herringbone helix angles do not match.");
}

// ── Render ──────────────────────────────────────────────────
mode = resolved_mode();
assert(mode == "single" || mode == "pair" || mode == "mesh_preview",
       "render_mode must be single, pair, or mesh_preview");
assert(module_size > 0 && num_teeth >= 8, "Primary gear needs positive module and at least 8 teeth");
assert(mate_module_size > 0 && mate_teeth >= 8, "Mate gear needs positive module and at least 8 teeth");

report_gear("Primary Gear", module_size, num_teeth, pressure_angle, gear_height, hub_diameter, bore_diameter);

if (mode == "single") {
    color("SteelBlue")
        gear(
            module_size, num_teeth, pressure_angle, backlash, gear_height,
            hub_diameter, hub_height, bore_diameter, keyway_width, keyway_depth,
            enable_spokes, spoke_count, spoke_width, pocket_floor, tip_chamfer,
            bore_chamfer, herringbone, helix_angle
        );
} else {
    report_gear("Mate Gear", mate_module_size, mate_teeth, mate_pressure_angle, mate_gear_height,
                mate_hub_diameter, mate_bore_diameter);
    report_pair();
    gear_pair();
}
